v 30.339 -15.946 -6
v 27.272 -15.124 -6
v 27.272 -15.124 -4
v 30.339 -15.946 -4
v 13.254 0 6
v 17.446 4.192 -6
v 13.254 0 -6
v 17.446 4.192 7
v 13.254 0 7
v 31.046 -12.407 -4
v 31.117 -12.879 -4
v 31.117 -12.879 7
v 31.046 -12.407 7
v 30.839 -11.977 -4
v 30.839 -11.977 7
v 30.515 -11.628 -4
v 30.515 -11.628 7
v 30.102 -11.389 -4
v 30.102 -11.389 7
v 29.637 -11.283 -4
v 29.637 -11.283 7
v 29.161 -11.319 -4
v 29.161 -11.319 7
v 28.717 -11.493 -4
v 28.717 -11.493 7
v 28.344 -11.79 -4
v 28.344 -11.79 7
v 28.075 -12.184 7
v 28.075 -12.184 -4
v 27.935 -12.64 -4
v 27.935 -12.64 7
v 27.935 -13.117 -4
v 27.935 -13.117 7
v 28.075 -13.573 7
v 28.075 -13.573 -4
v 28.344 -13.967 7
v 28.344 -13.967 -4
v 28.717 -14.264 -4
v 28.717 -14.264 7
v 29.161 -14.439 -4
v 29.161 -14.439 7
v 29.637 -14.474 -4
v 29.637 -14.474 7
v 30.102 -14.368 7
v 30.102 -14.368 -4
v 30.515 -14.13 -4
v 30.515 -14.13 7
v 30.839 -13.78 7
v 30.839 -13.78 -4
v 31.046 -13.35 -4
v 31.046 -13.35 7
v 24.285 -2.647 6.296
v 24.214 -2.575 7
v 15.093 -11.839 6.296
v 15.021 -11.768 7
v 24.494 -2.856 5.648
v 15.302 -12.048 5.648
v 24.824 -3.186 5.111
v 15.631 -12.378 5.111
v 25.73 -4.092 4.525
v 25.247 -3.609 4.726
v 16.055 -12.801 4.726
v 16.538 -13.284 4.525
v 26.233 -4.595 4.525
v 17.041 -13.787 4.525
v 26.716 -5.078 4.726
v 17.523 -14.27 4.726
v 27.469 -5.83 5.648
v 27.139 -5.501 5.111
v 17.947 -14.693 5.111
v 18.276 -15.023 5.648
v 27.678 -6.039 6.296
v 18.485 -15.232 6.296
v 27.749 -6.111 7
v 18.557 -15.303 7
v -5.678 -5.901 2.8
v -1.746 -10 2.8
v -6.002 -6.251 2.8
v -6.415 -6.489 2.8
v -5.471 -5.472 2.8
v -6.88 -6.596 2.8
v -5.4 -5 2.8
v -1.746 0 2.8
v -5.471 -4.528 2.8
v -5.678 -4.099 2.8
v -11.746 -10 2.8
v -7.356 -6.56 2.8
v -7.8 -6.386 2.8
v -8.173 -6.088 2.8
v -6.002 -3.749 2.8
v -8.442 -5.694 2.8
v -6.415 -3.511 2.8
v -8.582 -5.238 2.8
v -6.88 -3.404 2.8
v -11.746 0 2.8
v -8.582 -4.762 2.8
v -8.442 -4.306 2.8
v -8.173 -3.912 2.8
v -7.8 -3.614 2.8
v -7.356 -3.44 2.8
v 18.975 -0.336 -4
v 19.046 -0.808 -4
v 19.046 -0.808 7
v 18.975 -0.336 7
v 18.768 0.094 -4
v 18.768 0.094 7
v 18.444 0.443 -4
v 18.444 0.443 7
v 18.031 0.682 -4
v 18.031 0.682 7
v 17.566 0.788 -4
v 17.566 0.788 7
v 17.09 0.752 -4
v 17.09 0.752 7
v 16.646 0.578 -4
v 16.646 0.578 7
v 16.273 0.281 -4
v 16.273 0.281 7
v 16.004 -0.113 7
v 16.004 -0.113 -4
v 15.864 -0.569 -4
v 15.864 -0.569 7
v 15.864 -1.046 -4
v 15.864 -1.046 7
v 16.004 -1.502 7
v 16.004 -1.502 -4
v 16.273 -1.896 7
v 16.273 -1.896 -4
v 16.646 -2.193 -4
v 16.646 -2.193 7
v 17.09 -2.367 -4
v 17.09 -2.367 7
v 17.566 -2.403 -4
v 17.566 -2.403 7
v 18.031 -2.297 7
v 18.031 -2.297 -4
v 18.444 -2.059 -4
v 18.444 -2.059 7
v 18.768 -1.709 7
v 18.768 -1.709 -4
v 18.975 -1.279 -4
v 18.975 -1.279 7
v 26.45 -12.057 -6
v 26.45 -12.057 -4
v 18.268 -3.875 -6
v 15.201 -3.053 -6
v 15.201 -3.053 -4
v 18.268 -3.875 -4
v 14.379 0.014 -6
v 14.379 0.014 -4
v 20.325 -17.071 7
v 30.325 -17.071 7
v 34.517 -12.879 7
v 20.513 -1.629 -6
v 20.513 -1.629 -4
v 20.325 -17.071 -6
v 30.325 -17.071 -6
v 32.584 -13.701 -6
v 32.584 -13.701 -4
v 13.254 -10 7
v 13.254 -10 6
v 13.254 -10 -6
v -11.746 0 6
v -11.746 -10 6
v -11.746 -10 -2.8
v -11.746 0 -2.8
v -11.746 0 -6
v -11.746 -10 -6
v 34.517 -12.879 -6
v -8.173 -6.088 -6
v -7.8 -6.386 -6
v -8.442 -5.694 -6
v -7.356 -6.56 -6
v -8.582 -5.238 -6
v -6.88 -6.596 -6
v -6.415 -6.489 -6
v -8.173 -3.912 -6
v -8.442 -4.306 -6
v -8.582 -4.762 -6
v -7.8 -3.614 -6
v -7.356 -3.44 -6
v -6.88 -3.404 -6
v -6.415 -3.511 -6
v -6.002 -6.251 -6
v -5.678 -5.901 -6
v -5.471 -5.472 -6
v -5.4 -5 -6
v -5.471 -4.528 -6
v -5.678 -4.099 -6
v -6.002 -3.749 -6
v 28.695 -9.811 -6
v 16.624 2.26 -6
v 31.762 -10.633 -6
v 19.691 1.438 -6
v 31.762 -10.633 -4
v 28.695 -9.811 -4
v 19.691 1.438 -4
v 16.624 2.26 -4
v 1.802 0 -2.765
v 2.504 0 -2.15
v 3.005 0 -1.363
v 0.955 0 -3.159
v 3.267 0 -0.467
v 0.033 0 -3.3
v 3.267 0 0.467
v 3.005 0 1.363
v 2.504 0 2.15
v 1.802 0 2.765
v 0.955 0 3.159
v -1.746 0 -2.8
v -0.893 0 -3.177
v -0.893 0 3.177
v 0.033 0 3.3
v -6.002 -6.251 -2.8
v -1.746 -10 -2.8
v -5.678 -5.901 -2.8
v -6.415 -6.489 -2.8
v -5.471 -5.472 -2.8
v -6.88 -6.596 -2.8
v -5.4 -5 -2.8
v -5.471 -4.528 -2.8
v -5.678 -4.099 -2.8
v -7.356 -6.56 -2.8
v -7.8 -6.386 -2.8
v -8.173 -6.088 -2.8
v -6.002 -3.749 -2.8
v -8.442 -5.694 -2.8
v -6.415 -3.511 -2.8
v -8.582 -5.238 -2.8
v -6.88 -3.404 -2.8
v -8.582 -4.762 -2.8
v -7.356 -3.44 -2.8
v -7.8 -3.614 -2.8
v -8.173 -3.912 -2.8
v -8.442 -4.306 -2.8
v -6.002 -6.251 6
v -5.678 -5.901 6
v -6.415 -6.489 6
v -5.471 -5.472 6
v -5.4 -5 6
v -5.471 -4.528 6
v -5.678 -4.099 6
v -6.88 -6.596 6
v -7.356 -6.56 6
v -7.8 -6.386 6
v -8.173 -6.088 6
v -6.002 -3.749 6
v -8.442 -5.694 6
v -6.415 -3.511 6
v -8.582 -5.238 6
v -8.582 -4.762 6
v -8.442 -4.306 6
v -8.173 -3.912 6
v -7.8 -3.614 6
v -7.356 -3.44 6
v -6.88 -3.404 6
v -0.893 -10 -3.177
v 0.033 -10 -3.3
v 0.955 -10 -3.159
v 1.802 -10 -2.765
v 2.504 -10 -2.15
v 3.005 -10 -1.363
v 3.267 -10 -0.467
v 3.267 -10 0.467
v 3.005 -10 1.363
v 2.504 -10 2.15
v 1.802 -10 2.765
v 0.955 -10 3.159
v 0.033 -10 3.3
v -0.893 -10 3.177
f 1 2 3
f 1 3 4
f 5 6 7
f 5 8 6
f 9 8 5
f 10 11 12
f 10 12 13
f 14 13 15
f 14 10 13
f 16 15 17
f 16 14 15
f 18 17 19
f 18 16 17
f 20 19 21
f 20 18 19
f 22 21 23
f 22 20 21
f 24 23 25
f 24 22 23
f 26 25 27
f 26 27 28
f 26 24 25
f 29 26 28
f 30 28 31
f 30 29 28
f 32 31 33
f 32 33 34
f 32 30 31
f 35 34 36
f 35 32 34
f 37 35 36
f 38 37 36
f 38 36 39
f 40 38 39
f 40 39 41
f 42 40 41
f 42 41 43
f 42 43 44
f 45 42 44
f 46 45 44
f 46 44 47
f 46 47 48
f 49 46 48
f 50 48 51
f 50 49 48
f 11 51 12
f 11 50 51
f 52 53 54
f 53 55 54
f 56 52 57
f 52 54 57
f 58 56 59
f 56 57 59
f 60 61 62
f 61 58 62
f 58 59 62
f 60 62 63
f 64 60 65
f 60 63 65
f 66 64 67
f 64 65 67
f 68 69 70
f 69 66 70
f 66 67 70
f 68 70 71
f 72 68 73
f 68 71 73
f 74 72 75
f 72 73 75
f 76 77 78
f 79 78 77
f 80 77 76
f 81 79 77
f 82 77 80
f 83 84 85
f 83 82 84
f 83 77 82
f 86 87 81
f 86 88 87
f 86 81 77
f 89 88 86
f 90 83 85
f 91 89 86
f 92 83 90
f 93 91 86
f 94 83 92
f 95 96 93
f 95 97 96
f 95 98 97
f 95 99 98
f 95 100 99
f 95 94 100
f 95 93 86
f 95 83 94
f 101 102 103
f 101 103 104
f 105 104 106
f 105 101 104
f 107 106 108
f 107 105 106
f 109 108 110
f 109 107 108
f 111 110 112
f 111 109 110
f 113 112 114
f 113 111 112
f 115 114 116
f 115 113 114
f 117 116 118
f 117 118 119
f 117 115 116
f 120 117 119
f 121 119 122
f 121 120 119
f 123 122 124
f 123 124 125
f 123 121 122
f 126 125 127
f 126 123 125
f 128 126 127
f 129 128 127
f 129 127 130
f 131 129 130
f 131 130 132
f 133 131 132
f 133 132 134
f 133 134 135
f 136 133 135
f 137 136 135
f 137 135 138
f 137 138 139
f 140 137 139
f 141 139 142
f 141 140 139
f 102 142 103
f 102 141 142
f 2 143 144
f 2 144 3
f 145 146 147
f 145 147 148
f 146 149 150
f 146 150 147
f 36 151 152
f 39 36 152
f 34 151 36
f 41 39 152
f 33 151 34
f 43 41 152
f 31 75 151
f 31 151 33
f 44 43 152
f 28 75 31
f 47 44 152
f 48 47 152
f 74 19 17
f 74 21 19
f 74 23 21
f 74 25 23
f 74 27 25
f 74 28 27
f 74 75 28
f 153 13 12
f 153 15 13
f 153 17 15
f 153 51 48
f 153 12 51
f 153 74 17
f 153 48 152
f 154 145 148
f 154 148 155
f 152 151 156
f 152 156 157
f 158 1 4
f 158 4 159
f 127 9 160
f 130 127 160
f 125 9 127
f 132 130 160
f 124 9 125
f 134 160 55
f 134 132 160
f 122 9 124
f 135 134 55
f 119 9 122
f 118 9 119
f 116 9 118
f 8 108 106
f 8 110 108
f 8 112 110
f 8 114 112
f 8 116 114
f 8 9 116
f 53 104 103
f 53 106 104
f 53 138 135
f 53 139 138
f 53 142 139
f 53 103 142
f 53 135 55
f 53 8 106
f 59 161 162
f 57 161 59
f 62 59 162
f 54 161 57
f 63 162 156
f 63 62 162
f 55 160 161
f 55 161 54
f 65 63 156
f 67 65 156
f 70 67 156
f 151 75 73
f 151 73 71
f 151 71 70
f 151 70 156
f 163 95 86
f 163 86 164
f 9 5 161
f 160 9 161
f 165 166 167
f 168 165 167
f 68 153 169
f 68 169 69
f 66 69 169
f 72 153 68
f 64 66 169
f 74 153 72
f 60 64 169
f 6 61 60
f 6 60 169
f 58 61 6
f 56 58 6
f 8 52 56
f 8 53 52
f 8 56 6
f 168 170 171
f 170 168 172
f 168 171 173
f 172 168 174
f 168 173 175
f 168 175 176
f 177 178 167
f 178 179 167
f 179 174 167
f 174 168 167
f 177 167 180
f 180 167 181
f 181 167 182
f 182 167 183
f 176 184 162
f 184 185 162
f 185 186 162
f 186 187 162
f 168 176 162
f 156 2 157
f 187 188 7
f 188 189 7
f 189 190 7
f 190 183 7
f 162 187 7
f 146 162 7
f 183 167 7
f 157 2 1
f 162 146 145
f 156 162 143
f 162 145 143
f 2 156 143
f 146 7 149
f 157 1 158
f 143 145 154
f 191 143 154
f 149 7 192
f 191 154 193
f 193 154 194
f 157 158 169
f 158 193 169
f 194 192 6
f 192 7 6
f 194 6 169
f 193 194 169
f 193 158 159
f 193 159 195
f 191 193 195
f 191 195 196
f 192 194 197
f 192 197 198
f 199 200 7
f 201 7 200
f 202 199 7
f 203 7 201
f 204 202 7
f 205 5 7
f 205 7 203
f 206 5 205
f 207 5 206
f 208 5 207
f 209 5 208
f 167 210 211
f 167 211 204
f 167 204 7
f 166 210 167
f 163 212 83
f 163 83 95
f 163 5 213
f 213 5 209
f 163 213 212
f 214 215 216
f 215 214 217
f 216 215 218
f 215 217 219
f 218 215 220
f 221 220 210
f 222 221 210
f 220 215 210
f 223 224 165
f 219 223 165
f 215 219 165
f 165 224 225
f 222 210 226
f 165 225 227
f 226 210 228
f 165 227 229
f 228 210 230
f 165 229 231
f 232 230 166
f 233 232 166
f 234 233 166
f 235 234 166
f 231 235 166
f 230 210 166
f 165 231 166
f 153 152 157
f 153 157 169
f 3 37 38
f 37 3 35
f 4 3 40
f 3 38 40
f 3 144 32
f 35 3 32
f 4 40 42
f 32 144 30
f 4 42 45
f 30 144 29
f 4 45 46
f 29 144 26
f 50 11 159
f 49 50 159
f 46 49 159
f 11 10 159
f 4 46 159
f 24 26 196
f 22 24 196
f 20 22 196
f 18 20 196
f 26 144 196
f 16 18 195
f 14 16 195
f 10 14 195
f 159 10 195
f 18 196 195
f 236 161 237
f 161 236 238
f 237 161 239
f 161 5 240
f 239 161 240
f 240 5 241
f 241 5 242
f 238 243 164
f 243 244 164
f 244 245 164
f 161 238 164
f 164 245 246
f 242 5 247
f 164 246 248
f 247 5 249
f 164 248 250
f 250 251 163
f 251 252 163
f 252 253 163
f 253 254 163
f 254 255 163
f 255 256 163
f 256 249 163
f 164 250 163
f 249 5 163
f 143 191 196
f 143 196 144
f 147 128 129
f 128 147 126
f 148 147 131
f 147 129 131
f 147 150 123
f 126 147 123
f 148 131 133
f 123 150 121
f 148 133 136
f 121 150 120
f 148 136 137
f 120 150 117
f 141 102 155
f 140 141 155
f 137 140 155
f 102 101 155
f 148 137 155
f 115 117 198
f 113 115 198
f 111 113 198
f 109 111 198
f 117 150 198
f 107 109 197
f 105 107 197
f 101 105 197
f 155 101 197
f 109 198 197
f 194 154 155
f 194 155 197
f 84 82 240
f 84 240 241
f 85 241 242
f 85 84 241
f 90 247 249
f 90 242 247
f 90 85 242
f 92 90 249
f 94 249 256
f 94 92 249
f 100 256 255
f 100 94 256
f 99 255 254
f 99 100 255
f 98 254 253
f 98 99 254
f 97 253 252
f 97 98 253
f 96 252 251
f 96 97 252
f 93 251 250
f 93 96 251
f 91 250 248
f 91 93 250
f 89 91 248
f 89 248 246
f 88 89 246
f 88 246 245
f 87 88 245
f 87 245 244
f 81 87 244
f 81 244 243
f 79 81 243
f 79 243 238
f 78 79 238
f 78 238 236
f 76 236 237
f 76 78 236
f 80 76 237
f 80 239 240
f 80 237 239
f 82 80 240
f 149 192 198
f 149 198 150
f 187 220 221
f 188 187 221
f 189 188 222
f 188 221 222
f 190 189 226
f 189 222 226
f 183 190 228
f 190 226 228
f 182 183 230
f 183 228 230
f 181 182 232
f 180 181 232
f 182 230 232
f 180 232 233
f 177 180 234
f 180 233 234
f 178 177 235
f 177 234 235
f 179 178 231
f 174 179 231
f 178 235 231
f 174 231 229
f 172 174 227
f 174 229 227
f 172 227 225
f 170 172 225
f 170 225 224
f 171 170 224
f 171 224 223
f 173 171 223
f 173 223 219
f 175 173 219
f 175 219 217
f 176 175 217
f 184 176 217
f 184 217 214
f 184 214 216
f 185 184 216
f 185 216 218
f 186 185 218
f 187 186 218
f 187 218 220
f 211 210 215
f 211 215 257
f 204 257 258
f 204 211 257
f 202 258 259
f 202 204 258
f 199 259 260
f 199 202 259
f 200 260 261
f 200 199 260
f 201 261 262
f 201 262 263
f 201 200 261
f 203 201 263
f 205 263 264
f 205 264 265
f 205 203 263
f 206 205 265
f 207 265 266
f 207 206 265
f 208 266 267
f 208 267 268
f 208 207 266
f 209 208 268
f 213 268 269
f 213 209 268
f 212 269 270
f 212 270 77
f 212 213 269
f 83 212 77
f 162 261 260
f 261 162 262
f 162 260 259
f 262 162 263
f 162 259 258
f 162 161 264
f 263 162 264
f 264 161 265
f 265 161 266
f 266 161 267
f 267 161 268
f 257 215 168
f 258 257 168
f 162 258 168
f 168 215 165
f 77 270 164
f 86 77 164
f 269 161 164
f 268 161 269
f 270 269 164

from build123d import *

# Parameters (mm, degrees)
PAD_DEPTH            = 10
SKETCH_R             = 1.6
PAD001_DEPTH         = 7
PAD001_DEPTH_BACK    = 6
SKETCH004_R          = 2.5
POCKET_DEPTH         = 27.372693
POCKET001_DEPTH      = 2
SKETCH006_R          = 1.6
POCKET002_DEPTH      = 6.001
POCKET002_DEPTH_BACK = -7.001


with BuildPart() as part:
    # Sketch003 → Pad (new body)
    with BuildSketch(Plane.XZ):
        with BuildLine():
            Line((13.253575, -6), (-11.746425, -6))
            Line((-11.746425, -2.8), (-11.746425, -6))
            Line((-1.746425, -2.8), (-11.746425, -2.8))
            ThreePointArc((-1.746425, -2.8), (3.3, 0), (-1.746425, 2.8))
            Line((-1.746425, 2.8), (-11.746425, 2.8))
            Line((-11.746425, 2.8), (-11.746425, 6))
            Line((13.253575, 6), (-11.746425, 6))
            Line((13.253575, 6), (13.253575, 0))
            Line((13.253575, 0), (13.253575, -6))
        make_face()
    extrude(amount=PAD_DEPTH)

    # Sketch → Pad001 (join, two sides)
    with BuildSketch(Plane.XY) as pad001_sk:
        Polygon((13.253575, -10), (20.324643, -17.071068), (30.324643, -17.071068), (34.517031, -12.87868), (17.445963, 4.192388), (13.253575, 0), align=None)
        with Locations((17.445963, -0.807612)):
            Circle(SKETCH_R, mode=Mode.SUBTRACT)
        with Locations((29.517031, -12.87868)):
            Circle(SKETCH_R, mode=Mode.SUBTRACT)
    extrude(amount=PAD001_DEPTH)
    extrude(pad001_sk.sketch, amount=-PAD001_DEPTH_BACK)

    # Sketch004 (on DatumPlane) → Pocket (cut, through all)
    with BuildSketch(Plane(origin=(0, 0, 3.5), x_dir=(0, 0, -1), z_dir=(-0.707107, -0.707107, 0))):
        with Locations((-3.5, 21.442761)):
            Circle(SKETCH004_R)
    extrude(amount=-POCKET_DEPTH, mode=Mode.SUBTRACT)

    # Sketch005 (on DatumPlane) → Pocket001 (cut)
    with BuildSketch(Plane.XY.offset(-6)):
        Polygon((18.267824, -3.874838), (20.51319, -1.629473), (19.691329, 1.437754), (16.624102, 2.259615), (14.378737, 0.014249), (15.200598, -3.052977), align=None)
        Polygon((30.338892, -15.945906), (32.584257, -13.700541), (31.762397, -10.633314), (28.69517, -9.811453), (26.449805, -12.056819), (27.271665, -15.124045), align=None)
    extrude(amount=POCKET001_DEPTH, mode=Mode.SUBTRACT)

    # Sketch006 → Pocket002 (cut, two sides)
    with BuildSketch(Plane.XY) as pocket002_sk:
        with Locations((-7, -5)):
            Circle(SKETCH006_R)
    extrude(amount=-POCKET002_DEPTH, mode=Mode.SUBTRACT)
    extrude(pocket002_sk.sketch, amount=-POCKET002_DEPTH_BACK, mode=Mode.SUBTRACT)


solid = part.part
